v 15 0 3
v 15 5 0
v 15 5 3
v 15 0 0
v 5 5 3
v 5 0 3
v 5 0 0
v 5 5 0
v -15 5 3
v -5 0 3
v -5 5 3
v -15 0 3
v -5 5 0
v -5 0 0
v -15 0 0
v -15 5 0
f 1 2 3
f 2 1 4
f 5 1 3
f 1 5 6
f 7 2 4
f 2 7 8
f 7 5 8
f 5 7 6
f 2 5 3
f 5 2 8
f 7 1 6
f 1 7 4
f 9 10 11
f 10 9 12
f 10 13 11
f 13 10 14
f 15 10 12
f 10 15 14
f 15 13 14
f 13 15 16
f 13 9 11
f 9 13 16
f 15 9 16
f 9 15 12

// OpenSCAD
// Mirrored object
union() {
  translate([5, 0, 0]) cube([10, 5, 3]);
  mirror([1, 0, 0]) translate([5, 0, 0]) cube([10, 5, 3]);
}
